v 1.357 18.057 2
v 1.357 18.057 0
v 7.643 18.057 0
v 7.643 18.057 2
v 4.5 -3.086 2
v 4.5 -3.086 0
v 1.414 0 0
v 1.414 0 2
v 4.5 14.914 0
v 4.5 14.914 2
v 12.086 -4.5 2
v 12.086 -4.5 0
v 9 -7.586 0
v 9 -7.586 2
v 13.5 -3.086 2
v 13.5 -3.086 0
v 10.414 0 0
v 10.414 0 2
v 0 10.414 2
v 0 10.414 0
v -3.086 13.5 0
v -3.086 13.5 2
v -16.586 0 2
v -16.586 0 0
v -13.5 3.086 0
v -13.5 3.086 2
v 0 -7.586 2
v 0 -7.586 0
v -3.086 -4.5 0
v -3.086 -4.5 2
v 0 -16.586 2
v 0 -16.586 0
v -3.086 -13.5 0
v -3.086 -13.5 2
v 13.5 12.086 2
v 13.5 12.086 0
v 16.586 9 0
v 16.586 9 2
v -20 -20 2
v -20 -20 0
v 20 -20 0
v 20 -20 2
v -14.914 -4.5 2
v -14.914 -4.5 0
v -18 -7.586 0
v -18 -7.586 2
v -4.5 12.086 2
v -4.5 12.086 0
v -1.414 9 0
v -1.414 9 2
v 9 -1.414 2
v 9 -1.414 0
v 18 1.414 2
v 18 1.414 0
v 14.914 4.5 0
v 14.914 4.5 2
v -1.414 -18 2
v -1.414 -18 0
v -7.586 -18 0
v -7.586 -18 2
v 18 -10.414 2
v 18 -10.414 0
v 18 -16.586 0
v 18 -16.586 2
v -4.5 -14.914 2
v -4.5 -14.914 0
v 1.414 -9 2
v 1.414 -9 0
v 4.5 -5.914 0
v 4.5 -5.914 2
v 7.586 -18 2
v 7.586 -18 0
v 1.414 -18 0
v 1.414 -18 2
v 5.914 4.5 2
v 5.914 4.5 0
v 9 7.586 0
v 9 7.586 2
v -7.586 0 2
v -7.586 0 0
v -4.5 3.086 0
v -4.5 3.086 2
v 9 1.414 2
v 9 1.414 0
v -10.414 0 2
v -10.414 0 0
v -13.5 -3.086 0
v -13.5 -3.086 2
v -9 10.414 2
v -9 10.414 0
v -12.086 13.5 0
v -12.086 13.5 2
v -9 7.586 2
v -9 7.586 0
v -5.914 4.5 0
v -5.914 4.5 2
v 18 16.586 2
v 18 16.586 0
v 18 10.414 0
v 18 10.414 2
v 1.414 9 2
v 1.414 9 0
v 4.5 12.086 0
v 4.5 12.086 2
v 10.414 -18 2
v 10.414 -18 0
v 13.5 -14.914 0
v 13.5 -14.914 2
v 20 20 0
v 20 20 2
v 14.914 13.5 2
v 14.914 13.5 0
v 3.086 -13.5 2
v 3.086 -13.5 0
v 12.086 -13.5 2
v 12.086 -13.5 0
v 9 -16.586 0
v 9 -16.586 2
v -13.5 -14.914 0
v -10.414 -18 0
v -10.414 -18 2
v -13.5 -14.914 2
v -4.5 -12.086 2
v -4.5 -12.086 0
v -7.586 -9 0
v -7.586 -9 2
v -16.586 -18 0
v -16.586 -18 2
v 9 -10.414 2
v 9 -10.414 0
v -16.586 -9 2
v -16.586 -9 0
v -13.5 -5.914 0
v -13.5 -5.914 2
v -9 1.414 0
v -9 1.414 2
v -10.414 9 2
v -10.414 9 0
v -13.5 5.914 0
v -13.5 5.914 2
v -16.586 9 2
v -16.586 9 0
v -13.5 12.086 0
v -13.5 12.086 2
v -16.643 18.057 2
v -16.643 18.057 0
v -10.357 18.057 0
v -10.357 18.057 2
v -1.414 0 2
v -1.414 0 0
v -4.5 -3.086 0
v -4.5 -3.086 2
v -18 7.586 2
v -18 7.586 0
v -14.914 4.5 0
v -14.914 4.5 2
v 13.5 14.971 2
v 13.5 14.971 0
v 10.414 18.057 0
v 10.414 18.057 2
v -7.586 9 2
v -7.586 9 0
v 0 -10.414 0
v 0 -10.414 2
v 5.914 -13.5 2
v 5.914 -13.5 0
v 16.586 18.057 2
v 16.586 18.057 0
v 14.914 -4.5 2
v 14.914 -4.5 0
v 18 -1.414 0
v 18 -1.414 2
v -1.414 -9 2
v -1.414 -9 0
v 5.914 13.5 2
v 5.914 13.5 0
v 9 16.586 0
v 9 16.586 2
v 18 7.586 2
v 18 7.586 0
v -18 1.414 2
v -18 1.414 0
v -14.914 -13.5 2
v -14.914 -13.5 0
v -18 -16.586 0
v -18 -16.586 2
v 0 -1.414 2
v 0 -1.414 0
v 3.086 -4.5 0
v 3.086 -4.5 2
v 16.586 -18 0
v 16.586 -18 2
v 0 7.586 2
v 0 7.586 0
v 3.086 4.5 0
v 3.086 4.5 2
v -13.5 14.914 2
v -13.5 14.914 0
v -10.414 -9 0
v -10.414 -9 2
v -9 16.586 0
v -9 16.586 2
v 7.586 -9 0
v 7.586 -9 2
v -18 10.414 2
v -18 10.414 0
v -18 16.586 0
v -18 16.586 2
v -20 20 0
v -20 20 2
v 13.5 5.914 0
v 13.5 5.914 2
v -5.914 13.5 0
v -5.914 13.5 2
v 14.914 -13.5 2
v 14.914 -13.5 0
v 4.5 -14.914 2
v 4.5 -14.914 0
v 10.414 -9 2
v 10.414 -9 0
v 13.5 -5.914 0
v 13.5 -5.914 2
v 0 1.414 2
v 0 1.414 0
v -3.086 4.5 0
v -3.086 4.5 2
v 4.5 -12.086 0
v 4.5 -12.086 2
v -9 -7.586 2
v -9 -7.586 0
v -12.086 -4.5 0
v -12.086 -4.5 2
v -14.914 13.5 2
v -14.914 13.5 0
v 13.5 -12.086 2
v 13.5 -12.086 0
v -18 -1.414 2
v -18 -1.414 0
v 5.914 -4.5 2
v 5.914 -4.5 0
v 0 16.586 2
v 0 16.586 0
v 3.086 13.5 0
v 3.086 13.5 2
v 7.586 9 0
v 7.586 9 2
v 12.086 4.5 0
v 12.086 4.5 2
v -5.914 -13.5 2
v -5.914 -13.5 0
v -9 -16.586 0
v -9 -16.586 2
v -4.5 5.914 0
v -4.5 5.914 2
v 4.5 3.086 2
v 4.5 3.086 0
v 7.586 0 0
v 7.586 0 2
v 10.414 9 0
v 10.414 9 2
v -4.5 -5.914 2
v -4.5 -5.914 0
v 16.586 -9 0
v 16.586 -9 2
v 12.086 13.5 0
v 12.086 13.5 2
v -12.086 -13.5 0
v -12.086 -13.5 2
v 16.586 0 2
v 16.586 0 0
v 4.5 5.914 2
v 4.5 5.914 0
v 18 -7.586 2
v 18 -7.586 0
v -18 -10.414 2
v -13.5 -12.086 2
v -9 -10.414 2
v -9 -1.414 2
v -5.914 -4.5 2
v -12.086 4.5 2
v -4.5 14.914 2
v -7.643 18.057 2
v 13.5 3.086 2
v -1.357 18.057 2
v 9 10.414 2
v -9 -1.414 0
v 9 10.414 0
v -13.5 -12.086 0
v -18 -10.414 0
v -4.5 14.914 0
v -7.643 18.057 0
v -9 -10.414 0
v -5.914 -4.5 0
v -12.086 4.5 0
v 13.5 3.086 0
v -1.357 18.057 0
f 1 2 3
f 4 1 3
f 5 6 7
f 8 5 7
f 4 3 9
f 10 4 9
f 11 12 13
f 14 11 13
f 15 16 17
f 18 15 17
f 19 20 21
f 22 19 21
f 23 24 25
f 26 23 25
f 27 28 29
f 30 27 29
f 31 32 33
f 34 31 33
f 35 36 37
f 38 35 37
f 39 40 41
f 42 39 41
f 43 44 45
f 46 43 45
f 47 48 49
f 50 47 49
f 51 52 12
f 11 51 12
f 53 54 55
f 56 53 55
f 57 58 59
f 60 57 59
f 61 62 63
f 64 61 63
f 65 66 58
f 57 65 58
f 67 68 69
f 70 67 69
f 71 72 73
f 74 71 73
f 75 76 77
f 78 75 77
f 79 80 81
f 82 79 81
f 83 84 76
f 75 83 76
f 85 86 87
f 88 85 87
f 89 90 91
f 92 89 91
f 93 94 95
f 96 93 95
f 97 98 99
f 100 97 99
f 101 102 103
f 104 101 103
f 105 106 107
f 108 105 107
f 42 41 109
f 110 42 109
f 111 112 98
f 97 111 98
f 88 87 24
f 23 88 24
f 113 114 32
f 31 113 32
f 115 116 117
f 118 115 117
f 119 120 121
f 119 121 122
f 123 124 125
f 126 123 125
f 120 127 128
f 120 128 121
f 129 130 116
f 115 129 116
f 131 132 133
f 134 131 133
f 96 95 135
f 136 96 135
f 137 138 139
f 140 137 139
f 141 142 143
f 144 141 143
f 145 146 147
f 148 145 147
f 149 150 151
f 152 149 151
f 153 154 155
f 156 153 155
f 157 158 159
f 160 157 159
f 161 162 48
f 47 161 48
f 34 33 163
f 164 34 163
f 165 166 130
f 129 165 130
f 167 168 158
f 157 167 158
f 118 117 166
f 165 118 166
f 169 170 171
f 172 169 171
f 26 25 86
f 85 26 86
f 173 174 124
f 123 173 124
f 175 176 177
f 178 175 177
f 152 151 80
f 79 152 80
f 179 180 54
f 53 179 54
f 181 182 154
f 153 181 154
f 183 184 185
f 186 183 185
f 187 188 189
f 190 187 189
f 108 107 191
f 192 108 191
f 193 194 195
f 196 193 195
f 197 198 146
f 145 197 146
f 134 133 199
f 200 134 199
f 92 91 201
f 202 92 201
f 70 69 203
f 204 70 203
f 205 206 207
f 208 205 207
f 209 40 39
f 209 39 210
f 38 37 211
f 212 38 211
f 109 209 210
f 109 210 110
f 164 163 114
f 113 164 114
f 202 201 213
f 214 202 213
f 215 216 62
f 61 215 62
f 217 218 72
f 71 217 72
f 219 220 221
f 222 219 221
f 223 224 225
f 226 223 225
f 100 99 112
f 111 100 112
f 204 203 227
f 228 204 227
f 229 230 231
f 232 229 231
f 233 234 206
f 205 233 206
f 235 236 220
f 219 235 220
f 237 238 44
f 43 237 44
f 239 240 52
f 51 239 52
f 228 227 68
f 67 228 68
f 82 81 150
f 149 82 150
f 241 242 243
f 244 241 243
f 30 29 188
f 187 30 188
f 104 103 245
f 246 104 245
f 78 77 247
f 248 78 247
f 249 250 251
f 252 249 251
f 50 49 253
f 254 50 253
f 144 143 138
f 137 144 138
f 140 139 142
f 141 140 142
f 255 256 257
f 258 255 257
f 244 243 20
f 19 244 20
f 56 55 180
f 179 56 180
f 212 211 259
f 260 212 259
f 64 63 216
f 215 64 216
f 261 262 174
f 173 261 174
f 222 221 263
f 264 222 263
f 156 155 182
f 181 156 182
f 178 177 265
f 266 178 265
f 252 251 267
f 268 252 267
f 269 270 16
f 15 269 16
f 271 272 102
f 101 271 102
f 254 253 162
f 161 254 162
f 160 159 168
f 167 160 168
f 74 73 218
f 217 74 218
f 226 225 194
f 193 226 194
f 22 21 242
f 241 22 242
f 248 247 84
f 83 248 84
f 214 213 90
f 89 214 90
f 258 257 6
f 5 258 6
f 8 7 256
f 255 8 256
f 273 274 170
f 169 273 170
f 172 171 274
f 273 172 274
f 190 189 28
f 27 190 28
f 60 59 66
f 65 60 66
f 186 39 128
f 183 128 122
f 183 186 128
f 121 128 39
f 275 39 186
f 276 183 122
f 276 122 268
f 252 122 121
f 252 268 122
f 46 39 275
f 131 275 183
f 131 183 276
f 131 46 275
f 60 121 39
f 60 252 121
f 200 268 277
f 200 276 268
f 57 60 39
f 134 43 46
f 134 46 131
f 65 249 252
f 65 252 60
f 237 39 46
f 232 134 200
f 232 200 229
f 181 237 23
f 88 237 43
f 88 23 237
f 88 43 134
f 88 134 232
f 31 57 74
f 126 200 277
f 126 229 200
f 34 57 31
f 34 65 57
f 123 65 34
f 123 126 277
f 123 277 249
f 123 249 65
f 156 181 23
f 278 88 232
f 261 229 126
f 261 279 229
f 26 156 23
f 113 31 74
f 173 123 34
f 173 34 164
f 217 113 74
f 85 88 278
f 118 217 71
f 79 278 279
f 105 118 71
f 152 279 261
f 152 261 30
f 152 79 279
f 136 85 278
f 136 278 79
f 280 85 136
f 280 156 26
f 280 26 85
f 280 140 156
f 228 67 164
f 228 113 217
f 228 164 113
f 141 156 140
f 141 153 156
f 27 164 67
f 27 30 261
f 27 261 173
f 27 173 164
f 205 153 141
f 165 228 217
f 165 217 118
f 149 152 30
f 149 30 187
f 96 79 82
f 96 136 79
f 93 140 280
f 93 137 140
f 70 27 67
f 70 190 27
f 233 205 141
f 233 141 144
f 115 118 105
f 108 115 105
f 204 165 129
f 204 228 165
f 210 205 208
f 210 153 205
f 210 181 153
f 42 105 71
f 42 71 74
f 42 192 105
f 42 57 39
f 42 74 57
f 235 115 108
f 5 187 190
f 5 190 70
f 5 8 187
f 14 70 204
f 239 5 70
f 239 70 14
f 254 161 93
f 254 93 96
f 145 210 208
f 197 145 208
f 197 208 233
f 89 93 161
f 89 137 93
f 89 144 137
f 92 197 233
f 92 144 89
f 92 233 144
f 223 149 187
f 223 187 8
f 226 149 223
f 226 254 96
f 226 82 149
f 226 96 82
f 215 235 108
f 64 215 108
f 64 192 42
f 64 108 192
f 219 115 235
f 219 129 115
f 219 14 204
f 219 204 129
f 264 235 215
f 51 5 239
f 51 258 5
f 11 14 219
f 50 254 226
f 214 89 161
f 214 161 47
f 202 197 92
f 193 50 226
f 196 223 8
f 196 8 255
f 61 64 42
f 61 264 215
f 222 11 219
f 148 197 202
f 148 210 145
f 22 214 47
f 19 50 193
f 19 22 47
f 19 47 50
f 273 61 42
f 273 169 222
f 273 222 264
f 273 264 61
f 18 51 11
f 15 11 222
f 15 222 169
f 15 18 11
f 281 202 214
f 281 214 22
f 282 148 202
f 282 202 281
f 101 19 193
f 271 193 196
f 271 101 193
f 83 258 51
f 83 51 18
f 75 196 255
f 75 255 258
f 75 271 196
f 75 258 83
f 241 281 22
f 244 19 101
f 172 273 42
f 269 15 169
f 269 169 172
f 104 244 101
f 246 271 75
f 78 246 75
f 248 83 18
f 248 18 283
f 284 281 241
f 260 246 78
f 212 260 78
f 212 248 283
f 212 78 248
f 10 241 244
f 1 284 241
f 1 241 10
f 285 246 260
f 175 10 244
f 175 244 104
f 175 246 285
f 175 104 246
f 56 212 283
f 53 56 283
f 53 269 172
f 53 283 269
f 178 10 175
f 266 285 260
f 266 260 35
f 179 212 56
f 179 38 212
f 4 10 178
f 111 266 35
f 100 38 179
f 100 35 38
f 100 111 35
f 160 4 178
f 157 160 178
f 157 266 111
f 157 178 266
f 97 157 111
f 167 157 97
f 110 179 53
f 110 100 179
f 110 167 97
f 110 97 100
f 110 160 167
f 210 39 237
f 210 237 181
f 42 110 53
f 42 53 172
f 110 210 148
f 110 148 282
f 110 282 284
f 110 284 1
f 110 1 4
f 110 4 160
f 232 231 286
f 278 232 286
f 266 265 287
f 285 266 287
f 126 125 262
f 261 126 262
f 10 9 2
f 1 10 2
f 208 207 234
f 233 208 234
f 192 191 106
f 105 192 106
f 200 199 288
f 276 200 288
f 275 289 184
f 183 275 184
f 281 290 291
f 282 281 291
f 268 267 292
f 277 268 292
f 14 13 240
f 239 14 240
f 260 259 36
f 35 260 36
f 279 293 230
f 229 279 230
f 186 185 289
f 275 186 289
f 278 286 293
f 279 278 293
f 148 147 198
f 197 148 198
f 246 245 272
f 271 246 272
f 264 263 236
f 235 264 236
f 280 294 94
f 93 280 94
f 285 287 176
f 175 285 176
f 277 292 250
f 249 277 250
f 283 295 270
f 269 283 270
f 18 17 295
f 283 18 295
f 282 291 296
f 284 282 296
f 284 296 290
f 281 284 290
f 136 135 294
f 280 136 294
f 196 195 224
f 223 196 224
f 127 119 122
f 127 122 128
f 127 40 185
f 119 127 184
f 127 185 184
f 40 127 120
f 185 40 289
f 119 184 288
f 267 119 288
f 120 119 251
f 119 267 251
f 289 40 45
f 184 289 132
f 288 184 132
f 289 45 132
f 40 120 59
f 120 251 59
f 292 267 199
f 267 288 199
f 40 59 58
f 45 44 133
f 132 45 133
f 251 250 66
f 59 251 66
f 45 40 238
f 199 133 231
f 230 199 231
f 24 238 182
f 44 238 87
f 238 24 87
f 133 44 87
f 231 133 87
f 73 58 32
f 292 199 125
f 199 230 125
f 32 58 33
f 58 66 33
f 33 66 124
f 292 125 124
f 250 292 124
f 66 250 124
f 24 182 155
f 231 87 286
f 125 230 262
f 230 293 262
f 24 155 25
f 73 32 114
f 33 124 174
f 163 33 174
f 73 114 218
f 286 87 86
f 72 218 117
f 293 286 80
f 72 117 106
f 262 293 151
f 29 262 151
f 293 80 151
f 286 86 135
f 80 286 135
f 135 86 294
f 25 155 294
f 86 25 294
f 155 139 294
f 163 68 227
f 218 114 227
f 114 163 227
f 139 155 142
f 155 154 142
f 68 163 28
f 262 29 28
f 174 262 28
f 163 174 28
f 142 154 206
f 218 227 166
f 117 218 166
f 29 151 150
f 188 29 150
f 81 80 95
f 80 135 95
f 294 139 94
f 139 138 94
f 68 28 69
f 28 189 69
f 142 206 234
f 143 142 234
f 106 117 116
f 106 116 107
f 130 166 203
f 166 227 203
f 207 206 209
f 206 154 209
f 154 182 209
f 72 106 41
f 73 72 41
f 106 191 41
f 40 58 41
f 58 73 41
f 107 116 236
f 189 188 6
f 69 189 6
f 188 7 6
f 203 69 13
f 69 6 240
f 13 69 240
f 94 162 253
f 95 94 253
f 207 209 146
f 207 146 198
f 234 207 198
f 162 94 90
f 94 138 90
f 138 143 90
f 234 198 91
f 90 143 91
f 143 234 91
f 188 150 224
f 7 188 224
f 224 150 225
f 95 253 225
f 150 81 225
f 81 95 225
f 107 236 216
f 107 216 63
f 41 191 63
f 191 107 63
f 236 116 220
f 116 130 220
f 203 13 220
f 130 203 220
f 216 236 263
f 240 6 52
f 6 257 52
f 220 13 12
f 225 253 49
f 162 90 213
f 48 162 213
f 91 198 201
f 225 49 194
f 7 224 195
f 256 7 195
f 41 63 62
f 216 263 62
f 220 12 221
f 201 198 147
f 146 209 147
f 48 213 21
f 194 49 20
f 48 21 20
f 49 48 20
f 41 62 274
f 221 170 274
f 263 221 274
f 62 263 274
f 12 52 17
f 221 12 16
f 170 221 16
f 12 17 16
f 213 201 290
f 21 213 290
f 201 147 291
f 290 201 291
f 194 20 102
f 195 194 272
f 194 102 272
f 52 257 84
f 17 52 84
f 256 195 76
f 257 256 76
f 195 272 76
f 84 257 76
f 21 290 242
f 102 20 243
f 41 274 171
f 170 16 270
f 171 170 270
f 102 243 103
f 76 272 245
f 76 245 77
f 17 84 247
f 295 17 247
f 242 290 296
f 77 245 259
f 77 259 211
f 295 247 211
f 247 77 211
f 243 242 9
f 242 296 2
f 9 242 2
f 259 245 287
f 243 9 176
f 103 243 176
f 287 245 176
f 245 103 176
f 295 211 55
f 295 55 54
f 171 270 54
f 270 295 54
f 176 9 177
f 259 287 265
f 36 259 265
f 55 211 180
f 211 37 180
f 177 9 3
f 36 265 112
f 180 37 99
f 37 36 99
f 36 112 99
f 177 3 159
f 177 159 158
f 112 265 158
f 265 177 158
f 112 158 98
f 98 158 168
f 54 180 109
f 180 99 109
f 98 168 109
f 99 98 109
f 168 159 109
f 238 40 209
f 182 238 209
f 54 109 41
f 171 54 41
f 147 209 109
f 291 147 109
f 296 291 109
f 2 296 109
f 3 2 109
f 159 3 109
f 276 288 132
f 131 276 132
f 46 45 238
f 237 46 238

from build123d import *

# Parameters (mm, degrees)
SKETCH5_W           = 40
SKETCH5_H           = 40
BOSS_EXTRUDE2_DEPTH = 2
CUT_EXTRUDE1_DEPTH  = 2
CUT_EXTRUDE4_DEPTH  = 2
CUT_EXTRUDE5_DEPTH  = 2
CUT_EXTRUDE6_DEPTH  = 2
CUT_EXTRUDE7_DEPTH  = 2
CUT_EXTRUDE8_DEPTH  = 2


with BuildPart() as part:
    # Sketch5 → Boss-Extrude2 (new body)
    with BuildSketch(Plane.XY):
        Rectangle(SKETCH5_W, SKETCH5_H)
    extrude(amount=BOSS_EXTRUDE2_DEPTH)

    # Sketch4 → Cut-Extrude1 (cut)
    with BuildSketch(Plane.XY):
        Polygon((16.585786438, 18.056847711), (10.414213562, 18.056847711), (13.5, 14.971061274), align=None)
        Polygon((18, 10.414213562), (18, 16.585786438), (14.914213562, 13.5), align=None)
    extrude(amount=CUT_EXTRUDE1_DEPTH, mode=Mode.SUBTRACT)

    # Sketch4<5> → Cut-Extrude4 (cut)
    with BuildSketch(Plane.XY):
        Polygon((-13.5, -14.914213562), (-16.585786438, -18), (-10.414213562, -18), align=None)
        Polygon((-13.5, -12.085786438), (-10.414213562, -9), (-13.5, -5.914213562), (-16.585786438, -9), align=None)
        Polygon((-5.914213562, -13.5), (-9, -10.414213562), (-12.085786438, -13.5), (-9, -16.585786438), align=None)
        Polygon((-18, -16.585786438), (-14.914213562, -13.5), (-18, -10.414213562), align=None)
    extrude(amount=CUT_EXTRUDE4_DEPTH, mode=Mode.SUBTRACT)

    # Sketch4<6> → Cut-Extrude5 (cut)
    with BuildSketch(Plane.XY):
        Polygon((13.5, -14.914213562), (10.414213562, -18), (16.585786438, -18), align=None)
        Polygon((3.085786438, -13.5), (0, -10.414213562), (-3.085786438, -13.5), (0, -16.585786438), align=None)
        Polygon((-1.414213562, -18), (-4.5, -14.914213562), (-7.585786438, -18), align=None)
        Polygon((4.5, -5.914213562), (1.414213562, -9), (4.5, -12.085786438), (7.585786438, -9), align=None)
        Polygon((12.085786438, -13.5), (9, -10.414213562), (5.914213562, -13.5), (9, -16.585786438), align=None)
        Polygon((7.585786438, -18), (4.5, -14.914213562), (1.414213562, -18), align=None)
        Polygon((13.5, -5.914213562), (10.414213562, -9), (13.5, -12.085786438), (16.585786438, -9), align=None)
        Polygon((18, -16.585786438), (18, -10.414213562), (14.914213562, -13.5), align=None)
        Polygon((12.085786438, -4.5), (9, -1.414213562), (5.914213562, -4.5), (9, -7.585786438), align=None)
        Polygon((18, -7.585786438), (18, -1.414213562), (14.914213562, -4.5), align=None)
    extrude(amount=CUT_EXTRUDE5_DEPTH, mode=Mode.SUBTRACT)

    # Sketch4<7> → Cut-Extrude6 (cut)
    with BuildSketch(Plane.XY):
        Polygon((-4.5, -5.914213562), (-7.585786438, -9), (-4.5, -12.085786438), (-1.414213562, -9), align=None)
        Polygon((3.085786438, -4.5), (0, -1.414213562), (-3.085786438, -4.5), (0, -7.585786438), align=None)
        Polygon((4.5, 3.085786438), (1.414213562, 0), (4.5, -3.085786438), (7.585786438, 0), align=None)
        Polygon((13.5, 3.085786438), (10.414213562, 0), (13.5, -3.085786438), (16.585786438, 0), align=None)
        Polygon((3.085786438, 4.5), (0, 7.585786438), (-3.085786438, 4.5), (0, 1.414213562), align=None)
        Polygon((4.5, 12.085786438), (1.414213562, 9), (4.5, 5.914213562), (7.585786438, 9), align=None)
        Polygon((12.085786438, 4.5), (9, 7.585786438), (5.914213562, 4.5), (9, 1.414213562), align=None)
        Polygon((13.5, 12.085786438), (10.414213562, 9), (13.5, 5.914213562), (16.585786438, 9), align=None)
        Polygon((18, 1.414213562), (18, 7.585786438), (14.914213562, 4.5), align=None)
        Polygon((3.085786438, 13.5), (0, 16.585786438), (-3.085786438, 13.5), (0, 10.414213562), align=None)
        Polygon((7.642634149, 18.056847711), (1.357365851, 18.056847711), (4.5, 14.914213562), align=None)
        Polygon((12.085786438, 13.5), (9, 16.585786438), (5.914213562, 13.5), (9, 10.414213562), align=None)
    extrude(amount=CUT_EXTRUDE6_DEPTH, mode=Mode.SUBTRACT)

    # Sketch4<9> → Cut-Extrude7 (cut)
    with BuildSketch(Plane.XY):
        Polygon((-9, -7.585786438), (-5.914213562, -4.5), (-9, -1.414213562), (-12.085786438, -4.5), align=None)
        Polygon((-4.5, 3.085786438), (-7.585786438, 0), (-4.5, -3.085786438), (-1.414213562, 0), align=None)
        Polygon((-9, 1.414213562), (-5.914213562, 4.5), (-9, 7.585786438), (-12.085786438, 4.5), align=None)
        Polygon((-18, -7.585786438), (-14.914213562, -4.5), (-18, -1.414213562), align=None)
        Polygon((-13.5, 3.085786438), (-16.585786438, 0), (-13.5, -3.085786438), (-10.414213562, 0), align=None)
        Polygon((-18, 1.414213562), (-14.914213562, 4.5), (-18, 7.585786438), align=None)
    extrude(amount=CUT_EXTRUDE7_DEPTH, mode=Mode.SUBTRACT)

    # Sketch4<10> → Cut-Extrude8 (cut)
    with BuildSketch(Plane.XY):
        Polygon((-10.357365851, 18.056847711), (-16.642634149, 18.056847711), (-13.5, 14.914213562), align=None)
        Polygon((-14.914213562, 13.5), (-18, 16.585786438), (-18, 10.414213562), align=None)
        Polygon((-4.5, 12.085786438), (-7.585786438, 9), (-4.5, 5.914213562), (-1.414213562, 9), align=None)
        Polygon((-9, 10.414213562), (-5.914213562, 13.5), (-9, 16.585786438), (-12.085786438, 13.5), align=None)
        Polygon((-1.357365851, 18.056847711), (-7.642634149, 18.056847711), (-4.5, 14.914213562), align=None)
        Polygon((-13.5, 12.085786438), (-16.585786438, 9), (-13.5, 5.914213562), (-10.414213562, 9), align=None)
    extrude(amount=CUT_EXTRUDE8_DEPTH, mode=Mode.SUBTRACT)


solid = part.part
